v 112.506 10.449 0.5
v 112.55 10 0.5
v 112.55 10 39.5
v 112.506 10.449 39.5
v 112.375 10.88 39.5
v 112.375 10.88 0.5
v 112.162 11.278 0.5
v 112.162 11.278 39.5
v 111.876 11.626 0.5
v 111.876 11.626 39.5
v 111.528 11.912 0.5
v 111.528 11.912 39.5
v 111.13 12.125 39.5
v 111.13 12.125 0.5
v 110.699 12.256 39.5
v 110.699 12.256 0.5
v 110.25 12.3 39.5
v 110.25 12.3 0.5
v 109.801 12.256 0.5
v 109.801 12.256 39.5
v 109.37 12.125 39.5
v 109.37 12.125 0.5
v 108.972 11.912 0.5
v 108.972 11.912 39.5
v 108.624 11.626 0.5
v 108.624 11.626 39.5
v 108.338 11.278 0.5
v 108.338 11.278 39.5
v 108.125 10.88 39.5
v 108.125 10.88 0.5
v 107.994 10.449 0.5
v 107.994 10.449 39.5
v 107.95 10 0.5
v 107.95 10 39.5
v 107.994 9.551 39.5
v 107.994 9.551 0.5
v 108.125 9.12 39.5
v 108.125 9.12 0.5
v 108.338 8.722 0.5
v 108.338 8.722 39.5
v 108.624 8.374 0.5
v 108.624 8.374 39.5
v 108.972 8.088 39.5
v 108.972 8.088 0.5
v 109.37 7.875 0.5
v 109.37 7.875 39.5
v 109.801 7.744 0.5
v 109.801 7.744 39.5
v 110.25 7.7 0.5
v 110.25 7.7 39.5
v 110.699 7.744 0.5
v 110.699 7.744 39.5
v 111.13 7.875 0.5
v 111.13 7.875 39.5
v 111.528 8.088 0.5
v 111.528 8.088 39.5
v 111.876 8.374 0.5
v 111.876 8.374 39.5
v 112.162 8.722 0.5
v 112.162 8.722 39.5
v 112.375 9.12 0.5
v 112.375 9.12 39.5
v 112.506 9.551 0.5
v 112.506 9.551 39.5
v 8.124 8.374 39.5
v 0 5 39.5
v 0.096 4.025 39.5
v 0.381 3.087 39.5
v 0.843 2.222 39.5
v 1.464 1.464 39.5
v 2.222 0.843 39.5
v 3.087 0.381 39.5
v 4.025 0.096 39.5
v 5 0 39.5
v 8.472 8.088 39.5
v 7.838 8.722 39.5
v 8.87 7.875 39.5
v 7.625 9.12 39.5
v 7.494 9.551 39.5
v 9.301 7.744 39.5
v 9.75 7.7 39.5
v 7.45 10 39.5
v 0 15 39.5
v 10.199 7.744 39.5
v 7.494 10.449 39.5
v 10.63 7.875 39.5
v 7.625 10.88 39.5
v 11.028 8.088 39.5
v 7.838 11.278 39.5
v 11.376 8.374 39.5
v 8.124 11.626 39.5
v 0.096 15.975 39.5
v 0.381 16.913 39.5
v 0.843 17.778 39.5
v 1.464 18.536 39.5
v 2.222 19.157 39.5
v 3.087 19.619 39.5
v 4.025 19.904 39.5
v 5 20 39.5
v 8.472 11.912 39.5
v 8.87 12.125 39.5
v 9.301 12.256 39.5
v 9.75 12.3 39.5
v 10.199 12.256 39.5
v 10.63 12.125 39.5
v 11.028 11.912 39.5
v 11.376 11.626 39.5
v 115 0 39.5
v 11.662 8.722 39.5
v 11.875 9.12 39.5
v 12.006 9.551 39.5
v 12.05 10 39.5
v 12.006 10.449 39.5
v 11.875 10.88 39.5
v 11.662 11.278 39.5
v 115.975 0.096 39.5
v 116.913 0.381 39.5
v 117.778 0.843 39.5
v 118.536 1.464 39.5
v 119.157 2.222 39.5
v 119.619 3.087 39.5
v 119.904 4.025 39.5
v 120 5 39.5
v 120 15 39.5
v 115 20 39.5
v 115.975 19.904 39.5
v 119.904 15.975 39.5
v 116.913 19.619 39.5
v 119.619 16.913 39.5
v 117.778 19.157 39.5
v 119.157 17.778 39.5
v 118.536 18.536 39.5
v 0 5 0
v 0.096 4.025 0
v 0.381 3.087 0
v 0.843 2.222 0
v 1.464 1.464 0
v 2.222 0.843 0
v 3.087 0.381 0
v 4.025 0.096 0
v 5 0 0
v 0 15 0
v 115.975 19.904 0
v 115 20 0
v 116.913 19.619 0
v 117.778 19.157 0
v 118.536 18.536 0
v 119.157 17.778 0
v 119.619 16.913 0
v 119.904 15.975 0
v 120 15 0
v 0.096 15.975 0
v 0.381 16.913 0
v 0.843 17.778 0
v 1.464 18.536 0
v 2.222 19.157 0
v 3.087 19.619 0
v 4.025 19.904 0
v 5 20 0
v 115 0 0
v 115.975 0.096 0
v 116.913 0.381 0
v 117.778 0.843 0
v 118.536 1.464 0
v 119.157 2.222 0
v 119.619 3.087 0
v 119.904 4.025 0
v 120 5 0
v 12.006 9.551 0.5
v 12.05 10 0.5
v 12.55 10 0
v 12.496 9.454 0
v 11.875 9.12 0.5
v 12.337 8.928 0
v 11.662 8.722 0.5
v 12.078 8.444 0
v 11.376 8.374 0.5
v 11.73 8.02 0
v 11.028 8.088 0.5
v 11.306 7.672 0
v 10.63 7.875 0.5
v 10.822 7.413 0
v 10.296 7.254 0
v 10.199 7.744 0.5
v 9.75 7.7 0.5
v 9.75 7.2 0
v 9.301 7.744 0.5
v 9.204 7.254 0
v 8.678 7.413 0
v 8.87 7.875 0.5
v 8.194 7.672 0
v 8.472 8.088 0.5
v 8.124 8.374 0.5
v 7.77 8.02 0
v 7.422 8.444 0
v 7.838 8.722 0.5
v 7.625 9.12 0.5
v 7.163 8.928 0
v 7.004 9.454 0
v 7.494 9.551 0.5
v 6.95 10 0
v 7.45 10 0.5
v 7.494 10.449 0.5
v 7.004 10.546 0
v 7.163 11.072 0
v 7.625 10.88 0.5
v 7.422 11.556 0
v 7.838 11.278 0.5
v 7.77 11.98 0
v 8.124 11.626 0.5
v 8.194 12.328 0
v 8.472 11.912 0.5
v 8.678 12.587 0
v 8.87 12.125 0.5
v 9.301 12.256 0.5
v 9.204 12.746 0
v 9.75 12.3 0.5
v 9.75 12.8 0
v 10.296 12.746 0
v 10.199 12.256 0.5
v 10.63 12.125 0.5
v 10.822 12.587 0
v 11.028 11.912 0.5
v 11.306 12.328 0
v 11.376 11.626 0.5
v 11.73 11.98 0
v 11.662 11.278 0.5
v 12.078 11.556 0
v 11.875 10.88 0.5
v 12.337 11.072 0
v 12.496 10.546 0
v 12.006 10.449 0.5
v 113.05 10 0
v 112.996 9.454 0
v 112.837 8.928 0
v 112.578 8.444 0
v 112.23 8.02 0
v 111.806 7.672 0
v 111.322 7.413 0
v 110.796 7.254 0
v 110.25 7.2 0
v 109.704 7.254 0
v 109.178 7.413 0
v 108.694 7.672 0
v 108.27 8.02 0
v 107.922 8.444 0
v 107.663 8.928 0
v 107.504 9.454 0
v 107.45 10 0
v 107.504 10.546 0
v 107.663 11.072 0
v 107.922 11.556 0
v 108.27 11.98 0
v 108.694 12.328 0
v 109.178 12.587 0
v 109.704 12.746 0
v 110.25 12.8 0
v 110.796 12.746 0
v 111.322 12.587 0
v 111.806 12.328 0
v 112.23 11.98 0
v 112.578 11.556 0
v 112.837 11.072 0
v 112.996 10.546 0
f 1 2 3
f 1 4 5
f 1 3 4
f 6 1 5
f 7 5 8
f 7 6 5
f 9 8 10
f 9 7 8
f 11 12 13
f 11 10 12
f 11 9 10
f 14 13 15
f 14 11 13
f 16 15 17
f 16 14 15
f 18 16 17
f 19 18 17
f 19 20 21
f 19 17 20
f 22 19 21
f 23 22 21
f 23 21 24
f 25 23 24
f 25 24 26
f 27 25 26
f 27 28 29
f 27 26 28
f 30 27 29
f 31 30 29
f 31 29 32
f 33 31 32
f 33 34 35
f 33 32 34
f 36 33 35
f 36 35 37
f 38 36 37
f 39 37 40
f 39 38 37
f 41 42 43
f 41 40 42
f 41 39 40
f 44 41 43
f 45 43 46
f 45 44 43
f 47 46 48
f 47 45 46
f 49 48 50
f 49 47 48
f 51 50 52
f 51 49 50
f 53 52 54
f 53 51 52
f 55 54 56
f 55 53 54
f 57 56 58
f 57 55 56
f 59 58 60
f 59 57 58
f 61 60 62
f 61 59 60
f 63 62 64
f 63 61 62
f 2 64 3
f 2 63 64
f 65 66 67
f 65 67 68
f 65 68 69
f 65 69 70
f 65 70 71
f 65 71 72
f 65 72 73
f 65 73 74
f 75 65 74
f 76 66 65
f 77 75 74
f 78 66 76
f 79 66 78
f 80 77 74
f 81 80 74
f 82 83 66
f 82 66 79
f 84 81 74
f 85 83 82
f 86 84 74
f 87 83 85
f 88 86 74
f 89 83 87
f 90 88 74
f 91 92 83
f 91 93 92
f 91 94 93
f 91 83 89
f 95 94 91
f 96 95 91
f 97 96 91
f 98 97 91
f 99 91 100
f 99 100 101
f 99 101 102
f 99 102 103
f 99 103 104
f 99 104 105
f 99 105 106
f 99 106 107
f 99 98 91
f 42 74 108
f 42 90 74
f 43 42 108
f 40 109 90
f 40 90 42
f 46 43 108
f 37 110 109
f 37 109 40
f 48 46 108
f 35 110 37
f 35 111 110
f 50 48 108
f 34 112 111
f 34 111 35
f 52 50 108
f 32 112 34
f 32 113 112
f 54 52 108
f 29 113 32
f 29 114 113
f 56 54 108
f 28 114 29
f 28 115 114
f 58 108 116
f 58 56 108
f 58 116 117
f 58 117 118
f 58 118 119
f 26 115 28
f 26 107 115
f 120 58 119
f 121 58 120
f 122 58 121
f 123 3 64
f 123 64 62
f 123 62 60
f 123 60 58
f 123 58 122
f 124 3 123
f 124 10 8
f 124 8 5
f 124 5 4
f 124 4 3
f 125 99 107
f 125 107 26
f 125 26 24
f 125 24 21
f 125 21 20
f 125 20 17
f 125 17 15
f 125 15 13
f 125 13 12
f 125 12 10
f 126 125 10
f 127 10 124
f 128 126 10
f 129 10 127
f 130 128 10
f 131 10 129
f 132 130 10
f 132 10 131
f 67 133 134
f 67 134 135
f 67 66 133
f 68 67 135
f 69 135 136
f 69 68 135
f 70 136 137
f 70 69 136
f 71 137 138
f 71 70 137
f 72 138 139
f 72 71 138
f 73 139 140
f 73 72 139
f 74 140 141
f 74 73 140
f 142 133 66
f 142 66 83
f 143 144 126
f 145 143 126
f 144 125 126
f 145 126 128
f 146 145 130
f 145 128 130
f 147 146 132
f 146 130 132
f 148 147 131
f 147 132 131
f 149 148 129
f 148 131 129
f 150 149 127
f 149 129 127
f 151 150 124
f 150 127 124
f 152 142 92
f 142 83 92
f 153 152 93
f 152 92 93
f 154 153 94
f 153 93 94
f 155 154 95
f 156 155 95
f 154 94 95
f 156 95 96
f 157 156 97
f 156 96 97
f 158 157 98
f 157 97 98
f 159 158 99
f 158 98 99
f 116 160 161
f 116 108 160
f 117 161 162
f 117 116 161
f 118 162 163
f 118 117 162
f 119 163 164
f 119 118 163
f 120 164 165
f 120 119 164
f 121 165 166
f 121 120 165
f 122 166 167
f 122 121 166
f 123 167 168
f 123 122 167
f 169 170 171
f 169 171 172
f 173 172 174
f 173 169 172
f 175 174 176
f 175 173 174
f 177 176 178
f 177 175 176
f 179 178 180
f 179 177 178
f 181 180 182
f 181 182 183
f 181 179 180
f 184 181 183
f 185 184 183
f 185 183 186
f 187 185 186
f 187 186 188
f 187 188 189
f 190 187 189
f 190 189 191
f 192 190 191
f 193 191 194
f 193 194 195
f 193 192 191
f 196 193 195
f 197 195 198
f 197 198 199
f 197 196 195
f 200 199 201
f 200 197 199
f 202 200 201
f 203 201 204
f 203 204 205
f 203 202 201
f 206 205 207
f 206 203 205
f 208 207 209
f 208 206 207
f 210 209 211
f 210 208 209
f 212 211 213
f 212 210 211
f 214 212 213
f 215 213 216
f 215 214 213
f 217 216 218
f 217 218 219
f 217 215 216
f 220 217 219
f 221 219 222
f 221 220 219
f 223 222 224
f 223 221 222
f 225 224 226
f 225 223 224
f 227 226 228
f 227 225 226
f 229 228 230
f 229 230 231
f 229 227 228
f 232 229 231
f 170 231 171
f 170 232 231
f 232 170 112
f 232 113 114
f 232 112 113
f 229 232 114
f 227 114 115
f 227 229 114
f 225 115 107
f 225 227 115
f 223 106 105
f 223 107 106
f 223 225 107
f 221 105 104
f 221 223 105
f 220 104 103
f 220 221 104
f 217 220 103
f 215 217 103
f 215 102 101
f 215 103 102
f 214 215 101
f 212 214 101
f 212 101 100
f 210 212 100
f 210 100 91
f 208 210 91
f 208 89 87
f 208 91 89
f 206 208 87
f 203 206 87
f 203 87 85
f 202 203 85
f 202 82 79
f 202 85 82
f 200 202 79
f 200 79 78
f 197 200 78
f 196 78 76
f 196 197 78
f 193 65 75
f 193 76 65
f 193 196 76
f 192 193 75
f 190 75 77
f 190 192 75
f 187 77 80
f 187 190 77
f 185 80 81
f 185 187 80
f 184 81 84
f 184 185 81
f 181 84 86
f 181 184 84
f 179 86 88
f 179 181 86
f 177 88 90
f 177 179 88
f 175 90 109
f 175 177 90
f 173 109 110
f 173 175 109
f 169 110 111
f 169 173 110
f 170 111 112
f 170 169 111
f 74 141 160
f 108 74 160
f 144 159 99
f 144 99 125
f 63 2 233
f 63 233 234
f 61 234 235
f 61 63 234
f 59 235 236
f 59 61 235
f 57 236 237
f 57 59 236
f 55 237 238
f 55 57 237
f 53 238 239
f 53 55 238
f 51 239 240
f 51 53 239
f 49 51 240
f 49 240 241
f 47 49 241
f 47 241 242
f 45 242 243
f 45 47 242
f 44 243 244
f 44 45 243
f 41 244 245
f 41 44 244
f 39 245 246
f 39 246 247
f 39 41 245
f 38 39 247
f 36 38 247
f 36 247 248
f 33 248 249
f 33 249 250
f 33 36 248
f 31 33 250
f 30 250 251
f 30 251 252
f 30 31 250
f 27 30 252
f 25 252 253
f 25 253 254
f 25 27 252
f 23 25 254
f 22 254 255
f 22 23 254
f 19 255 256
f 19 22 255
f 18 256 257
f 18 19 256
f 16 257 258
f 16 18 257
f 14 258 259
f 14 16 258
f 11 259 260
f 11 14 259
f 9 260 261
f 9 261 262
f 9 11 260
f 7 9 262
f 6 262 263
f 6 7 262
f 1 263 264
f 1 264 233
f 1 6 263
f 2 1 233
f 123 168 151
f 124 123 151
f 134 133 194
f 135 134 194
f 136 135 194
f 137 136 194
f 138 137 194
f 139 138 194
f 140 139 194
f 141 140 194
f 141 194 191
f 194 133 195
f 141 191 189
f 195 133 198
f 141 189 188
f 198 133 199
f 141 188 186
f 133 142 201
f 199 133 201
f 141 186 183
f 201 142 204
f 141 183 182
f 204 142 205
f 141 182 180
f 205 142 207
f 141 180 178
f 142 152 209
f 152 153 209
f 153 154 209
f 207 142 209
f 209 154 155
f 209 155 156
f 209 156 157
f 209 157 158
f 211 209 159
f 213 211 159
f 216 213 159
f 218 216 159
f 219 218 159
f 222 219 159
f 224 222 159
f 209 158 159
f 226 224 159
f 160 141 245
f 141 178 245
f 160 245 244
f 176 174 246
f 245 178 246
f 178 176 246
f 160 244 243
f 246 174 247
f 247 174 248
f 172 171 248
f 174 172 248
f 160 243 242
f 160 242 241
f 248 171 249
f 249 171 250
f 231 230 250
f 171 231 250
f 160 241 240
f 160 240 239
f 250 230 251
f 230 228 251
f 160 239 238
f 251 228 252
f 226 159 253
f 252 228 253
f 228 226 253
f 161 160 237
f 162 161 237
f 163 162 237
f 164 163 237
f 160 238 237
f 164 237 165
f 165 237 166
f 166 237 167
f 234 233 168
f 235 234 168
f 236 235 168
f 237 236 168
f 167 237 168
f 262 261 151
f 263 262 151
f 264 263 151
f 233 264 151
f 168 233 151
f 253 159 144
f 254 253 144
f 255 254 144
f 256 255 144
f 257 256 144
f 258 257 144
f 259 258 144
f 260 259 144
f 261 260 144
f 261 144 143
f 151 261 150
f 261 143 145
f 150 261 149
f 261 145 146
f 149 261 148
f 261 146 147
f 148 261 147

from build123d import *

# Parameters (mm, degrees)
CYLINDER_R        = 2.3
CYLINDER_DEPTH    = 50
CYLINDER001_R     = 2.3
CYLINDER001_DEPTH = 50
BOX_W             = 120
BOX_H             = 20
BOX_DEPTH         = 39.5
FILLET_R          = 5
CHAMFER_SIZE      = 0.5


with BuildPart() as cylinder:
    # Cylinder → Cylinder (new body)
    with BuildSketch(Plane(origin=(9.75, 10, -1), x_dir=(1, 0, 0), z_dir=(0, 0, 1))):
        Circle(CYLINDER_R)
    extrude(amount=CYLINDER_DEPTH)


with BuildPart() as fusion:
    # Cylinder001 → Cylinder001 (new body)
    with BuildSketch(Plane(origin=(110.25, 10, -1), x_dir=(1, 0, 0), z_dir=(0, 0, 1))):
        Circle(CYLINDER001_R)
    extrude(amount=CYLINDER001_DEPTH)

    # Fusion: union Cylinder
    add(cylinder.part)


with BuildPart() as chamfer_body:
    # Box → Box (new body)
    with BuildSketch(Plane.XY):
        with Locations((60, 10)):
            Rectangle(BOX_W, BOX_H)
    extrude(amount=BOX_DEPTH)

    # Cut: cut Fusion
    add(fusion.part, mode=Mode.SUBTRACT)

    # Fillet
    fillet_edges = [chamfer_body.edges().sort_by_distance(p)[0] for p in [
        (0, 0, 19.75),
        (0, 20, 19.75),
        (120, 0, 19.75),
        (120, 20, 19.75),
    ]]
    fillet(fillet_edges, radius=FILLET_R)

    # Chamfer
    chamfer_edges = [chamfer_body.edges().sort_by_distance(p)[0] for p in [
        (107.95, 10, 0),
        (7.45, 10, 0),
    ]]
    chamfer(chamfer_edges, length=CHAMFER_SIZE)


solid = chamfer_body.part
